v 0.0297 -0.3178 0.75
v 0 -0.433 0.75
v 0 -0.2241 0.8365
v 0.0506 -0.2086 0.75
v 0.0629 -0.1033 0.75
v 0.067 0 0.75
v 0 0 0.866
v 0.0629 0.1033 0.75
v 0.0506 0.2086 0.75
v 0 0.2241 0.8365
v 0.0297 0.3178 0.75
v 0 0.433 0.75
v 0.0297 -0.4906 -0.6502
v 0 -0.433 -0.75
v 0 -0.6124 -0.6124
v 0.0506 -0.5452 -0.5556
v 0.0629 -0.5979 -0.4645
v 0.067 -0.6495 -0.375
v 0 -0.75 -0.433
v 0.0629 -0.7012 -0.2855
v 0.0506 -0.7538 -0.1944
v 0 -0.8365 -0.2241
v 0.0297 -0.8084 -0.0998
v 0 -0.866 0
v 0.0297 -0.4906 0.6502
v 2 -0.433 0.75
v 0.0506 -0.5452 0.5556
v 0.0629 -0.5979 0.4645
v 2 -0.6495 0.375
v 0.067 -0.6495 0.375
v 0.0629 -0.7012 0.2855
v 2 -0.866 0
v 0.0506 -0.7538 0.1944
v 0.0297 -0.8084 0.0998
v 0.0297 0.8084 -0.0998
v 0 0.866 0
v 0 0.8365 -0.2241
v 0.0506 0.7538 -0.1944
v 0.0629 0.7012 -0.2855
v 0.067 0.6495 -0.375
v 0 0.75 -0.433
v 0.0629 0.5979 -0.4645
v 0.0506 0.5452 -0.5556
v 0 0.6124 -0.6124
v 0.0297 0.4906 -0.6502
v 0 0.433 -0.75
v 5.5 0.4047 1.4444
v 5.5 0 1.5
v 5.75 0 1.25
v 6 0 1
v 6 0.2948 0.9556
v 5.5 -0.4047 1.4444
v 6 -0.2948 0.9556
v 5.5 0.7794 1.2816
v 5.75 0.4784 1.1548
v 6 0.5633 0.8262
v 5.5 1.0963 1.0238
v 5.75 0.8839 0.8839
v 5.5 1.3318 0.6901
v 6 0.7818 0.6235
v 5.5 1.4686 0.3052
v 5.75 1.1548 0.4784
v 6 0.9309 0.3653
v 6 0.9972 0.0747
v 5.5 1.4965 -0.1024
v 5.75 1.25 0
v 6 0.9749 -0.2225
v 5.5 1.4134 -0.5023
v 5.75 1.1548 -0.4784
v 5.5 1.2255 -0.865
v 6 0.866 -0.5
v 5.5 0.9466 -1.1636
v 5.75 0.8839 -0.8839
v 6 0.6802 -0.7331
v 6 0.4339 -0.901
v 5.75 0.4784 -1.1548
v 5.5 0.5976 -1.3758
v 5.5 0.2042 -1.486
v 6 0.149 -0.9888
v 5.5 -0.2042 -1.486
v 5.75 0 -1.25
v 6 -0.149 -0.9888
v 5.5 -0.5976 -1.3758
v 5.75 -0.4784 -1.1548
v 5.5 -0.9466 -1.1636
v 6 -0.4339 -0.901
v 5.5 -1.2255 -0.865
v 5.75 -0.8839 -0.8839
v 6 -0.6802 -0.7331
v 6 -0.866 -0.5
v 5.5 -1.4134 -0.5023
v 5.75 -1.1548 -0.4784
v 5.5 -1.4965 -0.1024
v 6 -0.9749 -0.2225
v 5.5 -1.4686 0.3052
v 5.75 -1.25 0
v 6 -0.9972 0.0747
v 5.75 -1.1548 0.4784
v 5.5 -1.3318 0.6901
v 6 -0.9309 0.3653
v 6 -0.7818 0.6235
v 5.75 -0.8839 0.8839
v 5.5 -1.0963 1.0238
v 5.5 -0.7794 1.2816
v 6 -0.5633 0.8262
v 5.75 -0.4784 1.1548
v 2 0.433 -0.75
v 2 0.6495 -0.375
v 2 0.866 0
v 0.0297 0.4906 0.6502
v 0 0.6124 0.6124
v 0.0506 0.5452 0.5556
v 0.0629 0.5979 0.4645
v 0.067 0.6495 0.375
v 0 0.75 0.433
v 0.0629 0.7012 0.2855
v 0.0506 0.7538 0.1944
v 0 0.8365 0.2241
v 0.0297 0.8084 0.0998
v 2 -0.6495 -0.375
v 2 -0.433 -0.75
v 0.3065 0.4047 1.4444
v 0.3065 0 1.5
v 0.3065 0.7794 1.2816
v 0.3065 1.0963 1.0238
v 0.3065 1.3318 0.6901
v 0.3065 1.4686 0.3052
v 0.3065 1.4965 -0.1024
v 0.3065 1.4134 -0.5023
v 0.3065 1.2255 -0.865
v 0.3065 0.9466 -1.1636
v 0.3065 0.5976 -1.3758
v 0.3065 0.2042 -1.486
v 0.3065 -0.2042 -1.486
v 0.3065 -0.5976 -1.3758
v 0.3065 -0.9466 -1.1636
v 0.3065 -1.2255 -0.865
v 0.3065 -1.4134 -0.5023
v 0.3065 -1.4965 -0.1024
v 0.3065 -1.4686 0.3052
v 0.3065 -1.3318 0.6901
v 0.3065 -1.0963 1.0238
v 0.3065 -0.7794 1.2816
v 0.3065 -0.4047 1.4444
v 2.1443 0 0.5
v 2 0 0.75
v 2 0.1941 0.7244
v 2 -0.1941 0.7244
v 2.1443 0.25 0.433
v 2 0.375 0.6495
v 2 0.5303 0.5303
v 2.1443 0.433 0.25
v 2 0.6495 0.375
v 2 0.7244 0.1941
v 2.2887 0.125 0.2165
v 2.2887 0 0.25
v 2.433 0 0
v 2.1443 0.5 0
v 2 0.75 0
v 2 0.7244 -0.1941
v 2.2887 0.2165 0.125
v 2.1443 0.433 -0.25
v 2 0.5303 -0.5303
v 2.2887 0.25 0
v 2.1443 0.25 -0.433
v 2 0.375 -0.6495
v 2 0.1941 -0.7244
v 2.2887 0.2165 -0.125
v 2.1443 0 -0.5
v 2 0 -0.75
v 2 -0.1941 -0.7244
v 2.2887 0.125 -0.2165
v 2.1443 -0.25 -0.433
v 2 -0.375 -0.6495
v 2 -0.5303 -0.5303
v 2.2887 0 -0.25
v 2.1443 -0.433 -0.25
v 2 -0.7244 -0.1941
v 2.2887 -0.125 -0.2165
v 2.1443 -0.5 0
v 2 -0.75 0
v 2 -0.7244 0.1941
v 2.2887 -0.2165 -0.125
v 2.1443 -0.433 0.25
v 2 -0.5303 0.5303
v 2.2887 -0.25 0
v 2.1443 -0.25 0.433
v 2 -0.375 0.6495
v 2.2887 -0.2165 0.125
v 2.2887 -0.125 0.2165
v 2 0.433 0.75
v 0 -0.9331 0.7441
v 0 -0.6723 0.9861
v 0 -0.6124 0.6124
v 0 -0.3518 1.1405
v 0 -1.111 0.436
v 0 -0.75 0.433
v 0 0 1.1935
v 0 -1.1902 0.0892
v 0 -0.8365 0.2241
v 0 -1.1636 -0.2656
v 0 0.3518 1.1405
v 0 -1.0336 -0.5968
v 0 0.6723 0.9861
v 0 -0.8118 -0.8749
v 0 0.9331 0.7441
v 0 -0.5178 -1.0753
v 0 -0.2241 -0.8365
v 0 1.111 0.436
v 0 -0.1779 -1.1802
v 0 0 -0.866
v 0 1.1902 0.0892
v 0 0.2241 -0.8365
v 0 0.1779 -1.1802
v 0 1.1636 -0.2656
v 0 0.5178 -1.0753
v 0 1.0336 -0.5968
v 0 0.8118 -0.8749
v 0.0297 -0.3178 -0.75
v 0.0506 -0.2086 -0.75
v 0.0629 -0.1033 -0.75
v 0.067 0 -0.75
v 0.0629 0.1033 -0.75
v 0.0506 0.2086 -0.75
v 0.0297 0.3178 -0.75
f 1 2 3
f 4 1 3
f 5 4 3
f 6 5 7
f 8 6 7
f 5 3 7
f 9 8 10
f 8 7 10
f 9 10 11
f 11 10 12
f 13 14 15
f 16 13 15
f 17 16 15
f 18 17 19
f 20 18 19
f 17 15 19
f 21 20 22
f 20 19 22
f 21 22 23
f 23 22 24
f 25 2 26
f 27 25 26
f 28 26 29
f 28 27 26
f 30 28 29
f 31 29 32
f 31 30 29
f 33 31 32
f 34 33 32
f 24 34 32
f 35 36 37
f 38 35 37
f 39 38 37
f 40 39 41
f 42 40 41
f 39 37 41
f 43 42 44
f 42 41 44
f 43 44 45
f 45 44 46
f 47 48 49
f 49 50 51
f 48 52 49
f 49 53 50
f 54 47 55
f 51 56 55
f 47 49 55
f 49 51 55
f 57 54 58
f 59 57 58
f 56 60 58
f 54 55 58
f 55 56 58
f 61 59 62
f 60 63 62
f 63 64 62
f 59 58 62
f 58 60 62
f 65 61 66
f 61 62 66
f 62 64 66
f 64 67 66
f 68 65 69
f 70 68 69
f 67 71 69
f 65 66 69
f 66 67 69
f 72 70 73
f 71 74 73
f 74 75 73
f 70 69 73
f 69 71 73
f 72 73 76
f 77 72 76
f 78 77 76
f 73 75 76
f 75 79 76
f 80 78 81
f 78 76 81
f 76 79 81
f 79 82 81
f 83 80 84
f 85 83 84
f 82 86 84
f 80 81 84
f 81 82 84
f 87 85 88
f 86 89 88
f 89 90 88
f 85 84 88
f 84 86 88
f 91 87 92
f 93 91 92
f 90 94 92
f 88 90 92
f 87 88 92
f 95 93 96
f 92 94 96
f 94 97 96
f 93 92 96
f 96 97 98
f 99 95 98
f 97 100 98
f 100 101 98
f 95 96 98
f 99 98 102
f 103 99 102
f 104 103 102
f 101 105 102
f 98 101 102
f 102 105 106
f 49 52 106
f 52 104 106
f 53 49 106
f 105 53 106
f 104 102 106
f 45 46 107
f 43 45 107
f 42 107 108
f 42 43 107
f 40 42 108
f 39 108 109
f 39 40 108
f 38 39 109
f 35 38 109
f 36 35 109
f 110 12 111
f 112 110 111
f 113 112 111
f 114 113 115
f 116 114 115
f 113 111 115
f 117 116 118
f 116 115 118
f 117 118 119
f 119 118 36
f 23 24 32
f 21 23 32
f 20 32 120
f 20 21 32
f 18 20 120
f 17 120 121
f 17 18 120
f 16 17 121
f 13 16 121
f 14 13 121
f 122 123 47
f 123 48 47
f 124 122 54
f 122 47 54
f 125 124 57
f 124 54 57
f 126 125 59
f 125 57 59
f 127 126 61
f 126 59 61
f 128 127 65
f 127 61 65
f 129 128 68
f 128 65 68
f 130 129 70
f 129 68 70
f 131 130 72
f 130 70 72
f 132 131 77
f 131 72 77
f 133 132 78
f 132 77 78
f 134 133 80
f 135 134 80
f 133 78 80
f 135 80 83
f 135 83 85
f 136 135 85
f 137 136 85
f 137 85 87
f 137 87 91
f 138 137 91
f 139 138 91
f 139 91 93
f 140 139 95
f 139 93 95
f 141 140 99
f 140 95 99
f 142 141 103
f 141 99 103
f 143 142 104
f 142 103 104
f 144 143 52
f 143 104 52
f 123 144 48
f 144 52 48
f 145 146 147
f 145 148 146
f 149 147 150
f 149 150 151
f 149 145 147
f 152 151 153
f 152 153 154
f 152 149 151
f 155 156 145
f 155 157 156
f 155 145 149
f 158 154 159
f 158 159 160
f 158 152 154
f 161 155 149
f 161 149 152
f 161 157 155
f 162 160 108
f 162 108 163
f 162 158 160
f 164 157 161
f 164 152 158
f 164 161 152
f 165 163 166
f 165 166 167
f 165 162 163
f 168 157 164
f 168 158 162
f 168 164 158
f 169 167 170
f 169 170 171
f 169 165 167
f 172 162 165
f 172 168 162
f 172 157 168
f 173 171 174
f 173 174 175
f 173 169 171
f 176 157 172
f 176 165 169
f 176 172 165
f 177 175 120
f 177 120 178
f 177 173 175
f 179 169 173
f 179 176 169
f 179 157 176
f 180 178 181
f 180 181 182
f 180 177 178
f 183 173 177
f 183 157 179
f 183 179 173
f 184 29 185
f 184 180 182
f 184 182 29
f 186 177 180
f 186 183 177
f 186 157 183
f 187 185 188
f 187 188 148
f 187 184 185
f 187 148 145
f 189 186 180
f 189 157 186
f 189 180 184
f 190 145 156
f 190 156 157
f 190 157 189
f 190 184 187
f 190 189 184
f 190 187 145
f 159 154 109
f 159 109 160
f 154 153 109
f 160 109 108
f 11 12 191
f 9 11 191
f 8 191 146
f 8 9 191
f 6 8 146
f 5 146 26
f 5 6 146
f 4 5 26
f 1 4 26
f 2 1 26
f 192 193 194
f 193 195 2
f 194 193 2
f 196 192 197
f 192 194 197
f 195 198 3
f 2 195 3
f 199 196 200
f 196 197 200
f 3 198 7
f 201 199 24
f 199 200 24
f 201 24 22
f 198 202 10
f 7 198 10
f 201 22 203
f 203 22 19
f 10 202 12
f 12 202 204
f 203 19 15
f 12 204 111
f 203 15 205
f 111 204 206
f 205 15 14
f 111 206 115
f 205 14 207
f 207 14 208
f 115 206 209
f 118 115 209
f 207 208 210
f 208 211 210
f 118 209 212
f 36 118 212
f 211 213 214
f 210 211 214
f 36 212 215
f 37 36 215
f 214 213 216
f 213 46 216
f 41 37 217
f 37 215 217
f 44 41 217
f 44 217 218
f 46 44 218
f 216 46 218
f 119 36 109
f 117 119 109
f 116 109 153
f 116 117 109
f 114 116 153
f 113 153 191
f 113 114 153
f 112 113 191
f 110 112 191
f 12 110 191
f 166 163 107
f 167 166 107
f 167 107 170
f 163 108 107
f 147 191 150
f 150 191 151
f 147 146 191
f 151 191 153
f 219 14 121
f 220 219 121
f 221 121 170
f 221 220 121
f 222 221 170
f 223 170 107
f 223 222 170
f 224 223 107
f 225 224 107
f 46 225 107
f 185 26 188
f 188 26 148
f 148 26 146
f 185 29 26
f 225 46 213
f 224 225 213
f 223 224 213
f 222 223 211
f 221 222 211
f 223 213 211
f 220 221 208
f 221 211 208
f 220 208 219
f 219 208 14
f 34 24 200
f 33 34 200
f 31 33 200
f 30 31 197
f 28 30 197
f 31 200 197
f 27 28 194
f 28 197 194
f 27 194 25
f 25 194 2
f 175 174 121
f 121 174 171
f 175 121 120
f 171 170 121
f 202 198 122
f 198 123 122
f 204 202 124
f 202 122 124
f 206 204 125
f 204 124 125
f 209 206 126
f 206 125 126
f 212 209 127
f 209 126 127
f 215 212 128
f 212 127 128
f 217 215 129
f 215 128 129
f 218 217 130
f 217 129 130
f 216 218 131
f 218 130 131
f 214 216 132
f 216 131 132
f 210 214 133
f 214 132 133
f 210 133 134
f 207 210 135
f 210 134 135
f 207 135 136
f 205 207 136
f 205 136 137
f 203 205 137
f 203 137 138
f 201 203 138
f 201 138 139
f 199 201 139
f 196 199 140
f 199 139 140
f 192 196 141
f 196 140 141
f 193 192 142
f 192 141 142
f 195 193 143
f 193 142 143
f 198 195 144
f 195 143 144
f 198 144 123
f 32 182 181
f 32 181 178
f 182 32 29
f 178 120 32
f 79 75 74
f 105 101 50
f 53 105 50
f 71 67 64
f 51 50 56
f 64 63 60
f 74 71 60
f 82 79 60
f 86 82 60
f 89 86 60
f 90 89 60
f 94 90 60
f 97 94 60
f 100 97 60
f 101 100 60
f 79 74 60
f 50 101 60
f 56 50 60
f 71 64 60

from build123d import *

# Parameters (mm, degrees)
SKETCH3_W          = 2
SKETCH3_H          = 0.75
CUT_EXTRUDE1_DEPTH = 2


with BuildPart() as part:
    # Sketch2 → Revolve1 (revolve)
    with BuildSketch(Plane.XY):
        Polygon((0, 0), (0, 1.1935), (0.3065, 1.5), (5.5, 1.5), (6, 1), (6, 0), align=None)
    revolve(axis=Axis((6, 0, 0), (-1, 0, 0)))

    # Sketch3 → Cut-Revolve1 (revolve, cut)
    with BuildSketch(Plane.XY):
        with Locations((1, 0.375)):
            Rectangle(SKETCH3_W, SKETCH3_H)
    revolve(axis=Axis((2, 0, 0), (-1, 0, 0)), mode=Mode.SUBTRACT)

    # Sketch4 → Cut-Revolve2 (revolve, cut)
    with BuildSketch(Plane.XY):
        Polygon((2, 0), (2, 0.75), (2.433012702, 0), align=None)
    revolve(axis=Axis((2.433012702, 0, 0), (-1, 0, 0)), mode=Mode.SUBTRACT)

    # Sketch5 → Cut-Revolve3 (revolve, cut)
    with BuildSketch(Plane.XY):
        Polygon((-0.3, 0.75), (0.066987298, 0.75), (0, 0.866025404), (-0.3, 0.866025404), align=None)
    revolve(axis=Axis((0, 0, 0), (-1, 0, 0)), mode=Mode.SUBTRACT)

    # Sketch1 → Cut-Extrude1 (cut)
    with BuildSketch(Plane(origin=(0, 0, 0), x_dir=(0, 0, -1), z_dir=(1, 0, 0))):
        Polygon((-0.75, -0.433012702), (0, -0.866025404), (0.75, -0.433012702), (0.75, 0.433012702), (0, 0.866025404), (-0.75, 0.433012702), align=None)
    extrude(amount=CUT_EXTRUDE1_DEPTH, mode=Mode.SUBTRACT)


solid = part.part
